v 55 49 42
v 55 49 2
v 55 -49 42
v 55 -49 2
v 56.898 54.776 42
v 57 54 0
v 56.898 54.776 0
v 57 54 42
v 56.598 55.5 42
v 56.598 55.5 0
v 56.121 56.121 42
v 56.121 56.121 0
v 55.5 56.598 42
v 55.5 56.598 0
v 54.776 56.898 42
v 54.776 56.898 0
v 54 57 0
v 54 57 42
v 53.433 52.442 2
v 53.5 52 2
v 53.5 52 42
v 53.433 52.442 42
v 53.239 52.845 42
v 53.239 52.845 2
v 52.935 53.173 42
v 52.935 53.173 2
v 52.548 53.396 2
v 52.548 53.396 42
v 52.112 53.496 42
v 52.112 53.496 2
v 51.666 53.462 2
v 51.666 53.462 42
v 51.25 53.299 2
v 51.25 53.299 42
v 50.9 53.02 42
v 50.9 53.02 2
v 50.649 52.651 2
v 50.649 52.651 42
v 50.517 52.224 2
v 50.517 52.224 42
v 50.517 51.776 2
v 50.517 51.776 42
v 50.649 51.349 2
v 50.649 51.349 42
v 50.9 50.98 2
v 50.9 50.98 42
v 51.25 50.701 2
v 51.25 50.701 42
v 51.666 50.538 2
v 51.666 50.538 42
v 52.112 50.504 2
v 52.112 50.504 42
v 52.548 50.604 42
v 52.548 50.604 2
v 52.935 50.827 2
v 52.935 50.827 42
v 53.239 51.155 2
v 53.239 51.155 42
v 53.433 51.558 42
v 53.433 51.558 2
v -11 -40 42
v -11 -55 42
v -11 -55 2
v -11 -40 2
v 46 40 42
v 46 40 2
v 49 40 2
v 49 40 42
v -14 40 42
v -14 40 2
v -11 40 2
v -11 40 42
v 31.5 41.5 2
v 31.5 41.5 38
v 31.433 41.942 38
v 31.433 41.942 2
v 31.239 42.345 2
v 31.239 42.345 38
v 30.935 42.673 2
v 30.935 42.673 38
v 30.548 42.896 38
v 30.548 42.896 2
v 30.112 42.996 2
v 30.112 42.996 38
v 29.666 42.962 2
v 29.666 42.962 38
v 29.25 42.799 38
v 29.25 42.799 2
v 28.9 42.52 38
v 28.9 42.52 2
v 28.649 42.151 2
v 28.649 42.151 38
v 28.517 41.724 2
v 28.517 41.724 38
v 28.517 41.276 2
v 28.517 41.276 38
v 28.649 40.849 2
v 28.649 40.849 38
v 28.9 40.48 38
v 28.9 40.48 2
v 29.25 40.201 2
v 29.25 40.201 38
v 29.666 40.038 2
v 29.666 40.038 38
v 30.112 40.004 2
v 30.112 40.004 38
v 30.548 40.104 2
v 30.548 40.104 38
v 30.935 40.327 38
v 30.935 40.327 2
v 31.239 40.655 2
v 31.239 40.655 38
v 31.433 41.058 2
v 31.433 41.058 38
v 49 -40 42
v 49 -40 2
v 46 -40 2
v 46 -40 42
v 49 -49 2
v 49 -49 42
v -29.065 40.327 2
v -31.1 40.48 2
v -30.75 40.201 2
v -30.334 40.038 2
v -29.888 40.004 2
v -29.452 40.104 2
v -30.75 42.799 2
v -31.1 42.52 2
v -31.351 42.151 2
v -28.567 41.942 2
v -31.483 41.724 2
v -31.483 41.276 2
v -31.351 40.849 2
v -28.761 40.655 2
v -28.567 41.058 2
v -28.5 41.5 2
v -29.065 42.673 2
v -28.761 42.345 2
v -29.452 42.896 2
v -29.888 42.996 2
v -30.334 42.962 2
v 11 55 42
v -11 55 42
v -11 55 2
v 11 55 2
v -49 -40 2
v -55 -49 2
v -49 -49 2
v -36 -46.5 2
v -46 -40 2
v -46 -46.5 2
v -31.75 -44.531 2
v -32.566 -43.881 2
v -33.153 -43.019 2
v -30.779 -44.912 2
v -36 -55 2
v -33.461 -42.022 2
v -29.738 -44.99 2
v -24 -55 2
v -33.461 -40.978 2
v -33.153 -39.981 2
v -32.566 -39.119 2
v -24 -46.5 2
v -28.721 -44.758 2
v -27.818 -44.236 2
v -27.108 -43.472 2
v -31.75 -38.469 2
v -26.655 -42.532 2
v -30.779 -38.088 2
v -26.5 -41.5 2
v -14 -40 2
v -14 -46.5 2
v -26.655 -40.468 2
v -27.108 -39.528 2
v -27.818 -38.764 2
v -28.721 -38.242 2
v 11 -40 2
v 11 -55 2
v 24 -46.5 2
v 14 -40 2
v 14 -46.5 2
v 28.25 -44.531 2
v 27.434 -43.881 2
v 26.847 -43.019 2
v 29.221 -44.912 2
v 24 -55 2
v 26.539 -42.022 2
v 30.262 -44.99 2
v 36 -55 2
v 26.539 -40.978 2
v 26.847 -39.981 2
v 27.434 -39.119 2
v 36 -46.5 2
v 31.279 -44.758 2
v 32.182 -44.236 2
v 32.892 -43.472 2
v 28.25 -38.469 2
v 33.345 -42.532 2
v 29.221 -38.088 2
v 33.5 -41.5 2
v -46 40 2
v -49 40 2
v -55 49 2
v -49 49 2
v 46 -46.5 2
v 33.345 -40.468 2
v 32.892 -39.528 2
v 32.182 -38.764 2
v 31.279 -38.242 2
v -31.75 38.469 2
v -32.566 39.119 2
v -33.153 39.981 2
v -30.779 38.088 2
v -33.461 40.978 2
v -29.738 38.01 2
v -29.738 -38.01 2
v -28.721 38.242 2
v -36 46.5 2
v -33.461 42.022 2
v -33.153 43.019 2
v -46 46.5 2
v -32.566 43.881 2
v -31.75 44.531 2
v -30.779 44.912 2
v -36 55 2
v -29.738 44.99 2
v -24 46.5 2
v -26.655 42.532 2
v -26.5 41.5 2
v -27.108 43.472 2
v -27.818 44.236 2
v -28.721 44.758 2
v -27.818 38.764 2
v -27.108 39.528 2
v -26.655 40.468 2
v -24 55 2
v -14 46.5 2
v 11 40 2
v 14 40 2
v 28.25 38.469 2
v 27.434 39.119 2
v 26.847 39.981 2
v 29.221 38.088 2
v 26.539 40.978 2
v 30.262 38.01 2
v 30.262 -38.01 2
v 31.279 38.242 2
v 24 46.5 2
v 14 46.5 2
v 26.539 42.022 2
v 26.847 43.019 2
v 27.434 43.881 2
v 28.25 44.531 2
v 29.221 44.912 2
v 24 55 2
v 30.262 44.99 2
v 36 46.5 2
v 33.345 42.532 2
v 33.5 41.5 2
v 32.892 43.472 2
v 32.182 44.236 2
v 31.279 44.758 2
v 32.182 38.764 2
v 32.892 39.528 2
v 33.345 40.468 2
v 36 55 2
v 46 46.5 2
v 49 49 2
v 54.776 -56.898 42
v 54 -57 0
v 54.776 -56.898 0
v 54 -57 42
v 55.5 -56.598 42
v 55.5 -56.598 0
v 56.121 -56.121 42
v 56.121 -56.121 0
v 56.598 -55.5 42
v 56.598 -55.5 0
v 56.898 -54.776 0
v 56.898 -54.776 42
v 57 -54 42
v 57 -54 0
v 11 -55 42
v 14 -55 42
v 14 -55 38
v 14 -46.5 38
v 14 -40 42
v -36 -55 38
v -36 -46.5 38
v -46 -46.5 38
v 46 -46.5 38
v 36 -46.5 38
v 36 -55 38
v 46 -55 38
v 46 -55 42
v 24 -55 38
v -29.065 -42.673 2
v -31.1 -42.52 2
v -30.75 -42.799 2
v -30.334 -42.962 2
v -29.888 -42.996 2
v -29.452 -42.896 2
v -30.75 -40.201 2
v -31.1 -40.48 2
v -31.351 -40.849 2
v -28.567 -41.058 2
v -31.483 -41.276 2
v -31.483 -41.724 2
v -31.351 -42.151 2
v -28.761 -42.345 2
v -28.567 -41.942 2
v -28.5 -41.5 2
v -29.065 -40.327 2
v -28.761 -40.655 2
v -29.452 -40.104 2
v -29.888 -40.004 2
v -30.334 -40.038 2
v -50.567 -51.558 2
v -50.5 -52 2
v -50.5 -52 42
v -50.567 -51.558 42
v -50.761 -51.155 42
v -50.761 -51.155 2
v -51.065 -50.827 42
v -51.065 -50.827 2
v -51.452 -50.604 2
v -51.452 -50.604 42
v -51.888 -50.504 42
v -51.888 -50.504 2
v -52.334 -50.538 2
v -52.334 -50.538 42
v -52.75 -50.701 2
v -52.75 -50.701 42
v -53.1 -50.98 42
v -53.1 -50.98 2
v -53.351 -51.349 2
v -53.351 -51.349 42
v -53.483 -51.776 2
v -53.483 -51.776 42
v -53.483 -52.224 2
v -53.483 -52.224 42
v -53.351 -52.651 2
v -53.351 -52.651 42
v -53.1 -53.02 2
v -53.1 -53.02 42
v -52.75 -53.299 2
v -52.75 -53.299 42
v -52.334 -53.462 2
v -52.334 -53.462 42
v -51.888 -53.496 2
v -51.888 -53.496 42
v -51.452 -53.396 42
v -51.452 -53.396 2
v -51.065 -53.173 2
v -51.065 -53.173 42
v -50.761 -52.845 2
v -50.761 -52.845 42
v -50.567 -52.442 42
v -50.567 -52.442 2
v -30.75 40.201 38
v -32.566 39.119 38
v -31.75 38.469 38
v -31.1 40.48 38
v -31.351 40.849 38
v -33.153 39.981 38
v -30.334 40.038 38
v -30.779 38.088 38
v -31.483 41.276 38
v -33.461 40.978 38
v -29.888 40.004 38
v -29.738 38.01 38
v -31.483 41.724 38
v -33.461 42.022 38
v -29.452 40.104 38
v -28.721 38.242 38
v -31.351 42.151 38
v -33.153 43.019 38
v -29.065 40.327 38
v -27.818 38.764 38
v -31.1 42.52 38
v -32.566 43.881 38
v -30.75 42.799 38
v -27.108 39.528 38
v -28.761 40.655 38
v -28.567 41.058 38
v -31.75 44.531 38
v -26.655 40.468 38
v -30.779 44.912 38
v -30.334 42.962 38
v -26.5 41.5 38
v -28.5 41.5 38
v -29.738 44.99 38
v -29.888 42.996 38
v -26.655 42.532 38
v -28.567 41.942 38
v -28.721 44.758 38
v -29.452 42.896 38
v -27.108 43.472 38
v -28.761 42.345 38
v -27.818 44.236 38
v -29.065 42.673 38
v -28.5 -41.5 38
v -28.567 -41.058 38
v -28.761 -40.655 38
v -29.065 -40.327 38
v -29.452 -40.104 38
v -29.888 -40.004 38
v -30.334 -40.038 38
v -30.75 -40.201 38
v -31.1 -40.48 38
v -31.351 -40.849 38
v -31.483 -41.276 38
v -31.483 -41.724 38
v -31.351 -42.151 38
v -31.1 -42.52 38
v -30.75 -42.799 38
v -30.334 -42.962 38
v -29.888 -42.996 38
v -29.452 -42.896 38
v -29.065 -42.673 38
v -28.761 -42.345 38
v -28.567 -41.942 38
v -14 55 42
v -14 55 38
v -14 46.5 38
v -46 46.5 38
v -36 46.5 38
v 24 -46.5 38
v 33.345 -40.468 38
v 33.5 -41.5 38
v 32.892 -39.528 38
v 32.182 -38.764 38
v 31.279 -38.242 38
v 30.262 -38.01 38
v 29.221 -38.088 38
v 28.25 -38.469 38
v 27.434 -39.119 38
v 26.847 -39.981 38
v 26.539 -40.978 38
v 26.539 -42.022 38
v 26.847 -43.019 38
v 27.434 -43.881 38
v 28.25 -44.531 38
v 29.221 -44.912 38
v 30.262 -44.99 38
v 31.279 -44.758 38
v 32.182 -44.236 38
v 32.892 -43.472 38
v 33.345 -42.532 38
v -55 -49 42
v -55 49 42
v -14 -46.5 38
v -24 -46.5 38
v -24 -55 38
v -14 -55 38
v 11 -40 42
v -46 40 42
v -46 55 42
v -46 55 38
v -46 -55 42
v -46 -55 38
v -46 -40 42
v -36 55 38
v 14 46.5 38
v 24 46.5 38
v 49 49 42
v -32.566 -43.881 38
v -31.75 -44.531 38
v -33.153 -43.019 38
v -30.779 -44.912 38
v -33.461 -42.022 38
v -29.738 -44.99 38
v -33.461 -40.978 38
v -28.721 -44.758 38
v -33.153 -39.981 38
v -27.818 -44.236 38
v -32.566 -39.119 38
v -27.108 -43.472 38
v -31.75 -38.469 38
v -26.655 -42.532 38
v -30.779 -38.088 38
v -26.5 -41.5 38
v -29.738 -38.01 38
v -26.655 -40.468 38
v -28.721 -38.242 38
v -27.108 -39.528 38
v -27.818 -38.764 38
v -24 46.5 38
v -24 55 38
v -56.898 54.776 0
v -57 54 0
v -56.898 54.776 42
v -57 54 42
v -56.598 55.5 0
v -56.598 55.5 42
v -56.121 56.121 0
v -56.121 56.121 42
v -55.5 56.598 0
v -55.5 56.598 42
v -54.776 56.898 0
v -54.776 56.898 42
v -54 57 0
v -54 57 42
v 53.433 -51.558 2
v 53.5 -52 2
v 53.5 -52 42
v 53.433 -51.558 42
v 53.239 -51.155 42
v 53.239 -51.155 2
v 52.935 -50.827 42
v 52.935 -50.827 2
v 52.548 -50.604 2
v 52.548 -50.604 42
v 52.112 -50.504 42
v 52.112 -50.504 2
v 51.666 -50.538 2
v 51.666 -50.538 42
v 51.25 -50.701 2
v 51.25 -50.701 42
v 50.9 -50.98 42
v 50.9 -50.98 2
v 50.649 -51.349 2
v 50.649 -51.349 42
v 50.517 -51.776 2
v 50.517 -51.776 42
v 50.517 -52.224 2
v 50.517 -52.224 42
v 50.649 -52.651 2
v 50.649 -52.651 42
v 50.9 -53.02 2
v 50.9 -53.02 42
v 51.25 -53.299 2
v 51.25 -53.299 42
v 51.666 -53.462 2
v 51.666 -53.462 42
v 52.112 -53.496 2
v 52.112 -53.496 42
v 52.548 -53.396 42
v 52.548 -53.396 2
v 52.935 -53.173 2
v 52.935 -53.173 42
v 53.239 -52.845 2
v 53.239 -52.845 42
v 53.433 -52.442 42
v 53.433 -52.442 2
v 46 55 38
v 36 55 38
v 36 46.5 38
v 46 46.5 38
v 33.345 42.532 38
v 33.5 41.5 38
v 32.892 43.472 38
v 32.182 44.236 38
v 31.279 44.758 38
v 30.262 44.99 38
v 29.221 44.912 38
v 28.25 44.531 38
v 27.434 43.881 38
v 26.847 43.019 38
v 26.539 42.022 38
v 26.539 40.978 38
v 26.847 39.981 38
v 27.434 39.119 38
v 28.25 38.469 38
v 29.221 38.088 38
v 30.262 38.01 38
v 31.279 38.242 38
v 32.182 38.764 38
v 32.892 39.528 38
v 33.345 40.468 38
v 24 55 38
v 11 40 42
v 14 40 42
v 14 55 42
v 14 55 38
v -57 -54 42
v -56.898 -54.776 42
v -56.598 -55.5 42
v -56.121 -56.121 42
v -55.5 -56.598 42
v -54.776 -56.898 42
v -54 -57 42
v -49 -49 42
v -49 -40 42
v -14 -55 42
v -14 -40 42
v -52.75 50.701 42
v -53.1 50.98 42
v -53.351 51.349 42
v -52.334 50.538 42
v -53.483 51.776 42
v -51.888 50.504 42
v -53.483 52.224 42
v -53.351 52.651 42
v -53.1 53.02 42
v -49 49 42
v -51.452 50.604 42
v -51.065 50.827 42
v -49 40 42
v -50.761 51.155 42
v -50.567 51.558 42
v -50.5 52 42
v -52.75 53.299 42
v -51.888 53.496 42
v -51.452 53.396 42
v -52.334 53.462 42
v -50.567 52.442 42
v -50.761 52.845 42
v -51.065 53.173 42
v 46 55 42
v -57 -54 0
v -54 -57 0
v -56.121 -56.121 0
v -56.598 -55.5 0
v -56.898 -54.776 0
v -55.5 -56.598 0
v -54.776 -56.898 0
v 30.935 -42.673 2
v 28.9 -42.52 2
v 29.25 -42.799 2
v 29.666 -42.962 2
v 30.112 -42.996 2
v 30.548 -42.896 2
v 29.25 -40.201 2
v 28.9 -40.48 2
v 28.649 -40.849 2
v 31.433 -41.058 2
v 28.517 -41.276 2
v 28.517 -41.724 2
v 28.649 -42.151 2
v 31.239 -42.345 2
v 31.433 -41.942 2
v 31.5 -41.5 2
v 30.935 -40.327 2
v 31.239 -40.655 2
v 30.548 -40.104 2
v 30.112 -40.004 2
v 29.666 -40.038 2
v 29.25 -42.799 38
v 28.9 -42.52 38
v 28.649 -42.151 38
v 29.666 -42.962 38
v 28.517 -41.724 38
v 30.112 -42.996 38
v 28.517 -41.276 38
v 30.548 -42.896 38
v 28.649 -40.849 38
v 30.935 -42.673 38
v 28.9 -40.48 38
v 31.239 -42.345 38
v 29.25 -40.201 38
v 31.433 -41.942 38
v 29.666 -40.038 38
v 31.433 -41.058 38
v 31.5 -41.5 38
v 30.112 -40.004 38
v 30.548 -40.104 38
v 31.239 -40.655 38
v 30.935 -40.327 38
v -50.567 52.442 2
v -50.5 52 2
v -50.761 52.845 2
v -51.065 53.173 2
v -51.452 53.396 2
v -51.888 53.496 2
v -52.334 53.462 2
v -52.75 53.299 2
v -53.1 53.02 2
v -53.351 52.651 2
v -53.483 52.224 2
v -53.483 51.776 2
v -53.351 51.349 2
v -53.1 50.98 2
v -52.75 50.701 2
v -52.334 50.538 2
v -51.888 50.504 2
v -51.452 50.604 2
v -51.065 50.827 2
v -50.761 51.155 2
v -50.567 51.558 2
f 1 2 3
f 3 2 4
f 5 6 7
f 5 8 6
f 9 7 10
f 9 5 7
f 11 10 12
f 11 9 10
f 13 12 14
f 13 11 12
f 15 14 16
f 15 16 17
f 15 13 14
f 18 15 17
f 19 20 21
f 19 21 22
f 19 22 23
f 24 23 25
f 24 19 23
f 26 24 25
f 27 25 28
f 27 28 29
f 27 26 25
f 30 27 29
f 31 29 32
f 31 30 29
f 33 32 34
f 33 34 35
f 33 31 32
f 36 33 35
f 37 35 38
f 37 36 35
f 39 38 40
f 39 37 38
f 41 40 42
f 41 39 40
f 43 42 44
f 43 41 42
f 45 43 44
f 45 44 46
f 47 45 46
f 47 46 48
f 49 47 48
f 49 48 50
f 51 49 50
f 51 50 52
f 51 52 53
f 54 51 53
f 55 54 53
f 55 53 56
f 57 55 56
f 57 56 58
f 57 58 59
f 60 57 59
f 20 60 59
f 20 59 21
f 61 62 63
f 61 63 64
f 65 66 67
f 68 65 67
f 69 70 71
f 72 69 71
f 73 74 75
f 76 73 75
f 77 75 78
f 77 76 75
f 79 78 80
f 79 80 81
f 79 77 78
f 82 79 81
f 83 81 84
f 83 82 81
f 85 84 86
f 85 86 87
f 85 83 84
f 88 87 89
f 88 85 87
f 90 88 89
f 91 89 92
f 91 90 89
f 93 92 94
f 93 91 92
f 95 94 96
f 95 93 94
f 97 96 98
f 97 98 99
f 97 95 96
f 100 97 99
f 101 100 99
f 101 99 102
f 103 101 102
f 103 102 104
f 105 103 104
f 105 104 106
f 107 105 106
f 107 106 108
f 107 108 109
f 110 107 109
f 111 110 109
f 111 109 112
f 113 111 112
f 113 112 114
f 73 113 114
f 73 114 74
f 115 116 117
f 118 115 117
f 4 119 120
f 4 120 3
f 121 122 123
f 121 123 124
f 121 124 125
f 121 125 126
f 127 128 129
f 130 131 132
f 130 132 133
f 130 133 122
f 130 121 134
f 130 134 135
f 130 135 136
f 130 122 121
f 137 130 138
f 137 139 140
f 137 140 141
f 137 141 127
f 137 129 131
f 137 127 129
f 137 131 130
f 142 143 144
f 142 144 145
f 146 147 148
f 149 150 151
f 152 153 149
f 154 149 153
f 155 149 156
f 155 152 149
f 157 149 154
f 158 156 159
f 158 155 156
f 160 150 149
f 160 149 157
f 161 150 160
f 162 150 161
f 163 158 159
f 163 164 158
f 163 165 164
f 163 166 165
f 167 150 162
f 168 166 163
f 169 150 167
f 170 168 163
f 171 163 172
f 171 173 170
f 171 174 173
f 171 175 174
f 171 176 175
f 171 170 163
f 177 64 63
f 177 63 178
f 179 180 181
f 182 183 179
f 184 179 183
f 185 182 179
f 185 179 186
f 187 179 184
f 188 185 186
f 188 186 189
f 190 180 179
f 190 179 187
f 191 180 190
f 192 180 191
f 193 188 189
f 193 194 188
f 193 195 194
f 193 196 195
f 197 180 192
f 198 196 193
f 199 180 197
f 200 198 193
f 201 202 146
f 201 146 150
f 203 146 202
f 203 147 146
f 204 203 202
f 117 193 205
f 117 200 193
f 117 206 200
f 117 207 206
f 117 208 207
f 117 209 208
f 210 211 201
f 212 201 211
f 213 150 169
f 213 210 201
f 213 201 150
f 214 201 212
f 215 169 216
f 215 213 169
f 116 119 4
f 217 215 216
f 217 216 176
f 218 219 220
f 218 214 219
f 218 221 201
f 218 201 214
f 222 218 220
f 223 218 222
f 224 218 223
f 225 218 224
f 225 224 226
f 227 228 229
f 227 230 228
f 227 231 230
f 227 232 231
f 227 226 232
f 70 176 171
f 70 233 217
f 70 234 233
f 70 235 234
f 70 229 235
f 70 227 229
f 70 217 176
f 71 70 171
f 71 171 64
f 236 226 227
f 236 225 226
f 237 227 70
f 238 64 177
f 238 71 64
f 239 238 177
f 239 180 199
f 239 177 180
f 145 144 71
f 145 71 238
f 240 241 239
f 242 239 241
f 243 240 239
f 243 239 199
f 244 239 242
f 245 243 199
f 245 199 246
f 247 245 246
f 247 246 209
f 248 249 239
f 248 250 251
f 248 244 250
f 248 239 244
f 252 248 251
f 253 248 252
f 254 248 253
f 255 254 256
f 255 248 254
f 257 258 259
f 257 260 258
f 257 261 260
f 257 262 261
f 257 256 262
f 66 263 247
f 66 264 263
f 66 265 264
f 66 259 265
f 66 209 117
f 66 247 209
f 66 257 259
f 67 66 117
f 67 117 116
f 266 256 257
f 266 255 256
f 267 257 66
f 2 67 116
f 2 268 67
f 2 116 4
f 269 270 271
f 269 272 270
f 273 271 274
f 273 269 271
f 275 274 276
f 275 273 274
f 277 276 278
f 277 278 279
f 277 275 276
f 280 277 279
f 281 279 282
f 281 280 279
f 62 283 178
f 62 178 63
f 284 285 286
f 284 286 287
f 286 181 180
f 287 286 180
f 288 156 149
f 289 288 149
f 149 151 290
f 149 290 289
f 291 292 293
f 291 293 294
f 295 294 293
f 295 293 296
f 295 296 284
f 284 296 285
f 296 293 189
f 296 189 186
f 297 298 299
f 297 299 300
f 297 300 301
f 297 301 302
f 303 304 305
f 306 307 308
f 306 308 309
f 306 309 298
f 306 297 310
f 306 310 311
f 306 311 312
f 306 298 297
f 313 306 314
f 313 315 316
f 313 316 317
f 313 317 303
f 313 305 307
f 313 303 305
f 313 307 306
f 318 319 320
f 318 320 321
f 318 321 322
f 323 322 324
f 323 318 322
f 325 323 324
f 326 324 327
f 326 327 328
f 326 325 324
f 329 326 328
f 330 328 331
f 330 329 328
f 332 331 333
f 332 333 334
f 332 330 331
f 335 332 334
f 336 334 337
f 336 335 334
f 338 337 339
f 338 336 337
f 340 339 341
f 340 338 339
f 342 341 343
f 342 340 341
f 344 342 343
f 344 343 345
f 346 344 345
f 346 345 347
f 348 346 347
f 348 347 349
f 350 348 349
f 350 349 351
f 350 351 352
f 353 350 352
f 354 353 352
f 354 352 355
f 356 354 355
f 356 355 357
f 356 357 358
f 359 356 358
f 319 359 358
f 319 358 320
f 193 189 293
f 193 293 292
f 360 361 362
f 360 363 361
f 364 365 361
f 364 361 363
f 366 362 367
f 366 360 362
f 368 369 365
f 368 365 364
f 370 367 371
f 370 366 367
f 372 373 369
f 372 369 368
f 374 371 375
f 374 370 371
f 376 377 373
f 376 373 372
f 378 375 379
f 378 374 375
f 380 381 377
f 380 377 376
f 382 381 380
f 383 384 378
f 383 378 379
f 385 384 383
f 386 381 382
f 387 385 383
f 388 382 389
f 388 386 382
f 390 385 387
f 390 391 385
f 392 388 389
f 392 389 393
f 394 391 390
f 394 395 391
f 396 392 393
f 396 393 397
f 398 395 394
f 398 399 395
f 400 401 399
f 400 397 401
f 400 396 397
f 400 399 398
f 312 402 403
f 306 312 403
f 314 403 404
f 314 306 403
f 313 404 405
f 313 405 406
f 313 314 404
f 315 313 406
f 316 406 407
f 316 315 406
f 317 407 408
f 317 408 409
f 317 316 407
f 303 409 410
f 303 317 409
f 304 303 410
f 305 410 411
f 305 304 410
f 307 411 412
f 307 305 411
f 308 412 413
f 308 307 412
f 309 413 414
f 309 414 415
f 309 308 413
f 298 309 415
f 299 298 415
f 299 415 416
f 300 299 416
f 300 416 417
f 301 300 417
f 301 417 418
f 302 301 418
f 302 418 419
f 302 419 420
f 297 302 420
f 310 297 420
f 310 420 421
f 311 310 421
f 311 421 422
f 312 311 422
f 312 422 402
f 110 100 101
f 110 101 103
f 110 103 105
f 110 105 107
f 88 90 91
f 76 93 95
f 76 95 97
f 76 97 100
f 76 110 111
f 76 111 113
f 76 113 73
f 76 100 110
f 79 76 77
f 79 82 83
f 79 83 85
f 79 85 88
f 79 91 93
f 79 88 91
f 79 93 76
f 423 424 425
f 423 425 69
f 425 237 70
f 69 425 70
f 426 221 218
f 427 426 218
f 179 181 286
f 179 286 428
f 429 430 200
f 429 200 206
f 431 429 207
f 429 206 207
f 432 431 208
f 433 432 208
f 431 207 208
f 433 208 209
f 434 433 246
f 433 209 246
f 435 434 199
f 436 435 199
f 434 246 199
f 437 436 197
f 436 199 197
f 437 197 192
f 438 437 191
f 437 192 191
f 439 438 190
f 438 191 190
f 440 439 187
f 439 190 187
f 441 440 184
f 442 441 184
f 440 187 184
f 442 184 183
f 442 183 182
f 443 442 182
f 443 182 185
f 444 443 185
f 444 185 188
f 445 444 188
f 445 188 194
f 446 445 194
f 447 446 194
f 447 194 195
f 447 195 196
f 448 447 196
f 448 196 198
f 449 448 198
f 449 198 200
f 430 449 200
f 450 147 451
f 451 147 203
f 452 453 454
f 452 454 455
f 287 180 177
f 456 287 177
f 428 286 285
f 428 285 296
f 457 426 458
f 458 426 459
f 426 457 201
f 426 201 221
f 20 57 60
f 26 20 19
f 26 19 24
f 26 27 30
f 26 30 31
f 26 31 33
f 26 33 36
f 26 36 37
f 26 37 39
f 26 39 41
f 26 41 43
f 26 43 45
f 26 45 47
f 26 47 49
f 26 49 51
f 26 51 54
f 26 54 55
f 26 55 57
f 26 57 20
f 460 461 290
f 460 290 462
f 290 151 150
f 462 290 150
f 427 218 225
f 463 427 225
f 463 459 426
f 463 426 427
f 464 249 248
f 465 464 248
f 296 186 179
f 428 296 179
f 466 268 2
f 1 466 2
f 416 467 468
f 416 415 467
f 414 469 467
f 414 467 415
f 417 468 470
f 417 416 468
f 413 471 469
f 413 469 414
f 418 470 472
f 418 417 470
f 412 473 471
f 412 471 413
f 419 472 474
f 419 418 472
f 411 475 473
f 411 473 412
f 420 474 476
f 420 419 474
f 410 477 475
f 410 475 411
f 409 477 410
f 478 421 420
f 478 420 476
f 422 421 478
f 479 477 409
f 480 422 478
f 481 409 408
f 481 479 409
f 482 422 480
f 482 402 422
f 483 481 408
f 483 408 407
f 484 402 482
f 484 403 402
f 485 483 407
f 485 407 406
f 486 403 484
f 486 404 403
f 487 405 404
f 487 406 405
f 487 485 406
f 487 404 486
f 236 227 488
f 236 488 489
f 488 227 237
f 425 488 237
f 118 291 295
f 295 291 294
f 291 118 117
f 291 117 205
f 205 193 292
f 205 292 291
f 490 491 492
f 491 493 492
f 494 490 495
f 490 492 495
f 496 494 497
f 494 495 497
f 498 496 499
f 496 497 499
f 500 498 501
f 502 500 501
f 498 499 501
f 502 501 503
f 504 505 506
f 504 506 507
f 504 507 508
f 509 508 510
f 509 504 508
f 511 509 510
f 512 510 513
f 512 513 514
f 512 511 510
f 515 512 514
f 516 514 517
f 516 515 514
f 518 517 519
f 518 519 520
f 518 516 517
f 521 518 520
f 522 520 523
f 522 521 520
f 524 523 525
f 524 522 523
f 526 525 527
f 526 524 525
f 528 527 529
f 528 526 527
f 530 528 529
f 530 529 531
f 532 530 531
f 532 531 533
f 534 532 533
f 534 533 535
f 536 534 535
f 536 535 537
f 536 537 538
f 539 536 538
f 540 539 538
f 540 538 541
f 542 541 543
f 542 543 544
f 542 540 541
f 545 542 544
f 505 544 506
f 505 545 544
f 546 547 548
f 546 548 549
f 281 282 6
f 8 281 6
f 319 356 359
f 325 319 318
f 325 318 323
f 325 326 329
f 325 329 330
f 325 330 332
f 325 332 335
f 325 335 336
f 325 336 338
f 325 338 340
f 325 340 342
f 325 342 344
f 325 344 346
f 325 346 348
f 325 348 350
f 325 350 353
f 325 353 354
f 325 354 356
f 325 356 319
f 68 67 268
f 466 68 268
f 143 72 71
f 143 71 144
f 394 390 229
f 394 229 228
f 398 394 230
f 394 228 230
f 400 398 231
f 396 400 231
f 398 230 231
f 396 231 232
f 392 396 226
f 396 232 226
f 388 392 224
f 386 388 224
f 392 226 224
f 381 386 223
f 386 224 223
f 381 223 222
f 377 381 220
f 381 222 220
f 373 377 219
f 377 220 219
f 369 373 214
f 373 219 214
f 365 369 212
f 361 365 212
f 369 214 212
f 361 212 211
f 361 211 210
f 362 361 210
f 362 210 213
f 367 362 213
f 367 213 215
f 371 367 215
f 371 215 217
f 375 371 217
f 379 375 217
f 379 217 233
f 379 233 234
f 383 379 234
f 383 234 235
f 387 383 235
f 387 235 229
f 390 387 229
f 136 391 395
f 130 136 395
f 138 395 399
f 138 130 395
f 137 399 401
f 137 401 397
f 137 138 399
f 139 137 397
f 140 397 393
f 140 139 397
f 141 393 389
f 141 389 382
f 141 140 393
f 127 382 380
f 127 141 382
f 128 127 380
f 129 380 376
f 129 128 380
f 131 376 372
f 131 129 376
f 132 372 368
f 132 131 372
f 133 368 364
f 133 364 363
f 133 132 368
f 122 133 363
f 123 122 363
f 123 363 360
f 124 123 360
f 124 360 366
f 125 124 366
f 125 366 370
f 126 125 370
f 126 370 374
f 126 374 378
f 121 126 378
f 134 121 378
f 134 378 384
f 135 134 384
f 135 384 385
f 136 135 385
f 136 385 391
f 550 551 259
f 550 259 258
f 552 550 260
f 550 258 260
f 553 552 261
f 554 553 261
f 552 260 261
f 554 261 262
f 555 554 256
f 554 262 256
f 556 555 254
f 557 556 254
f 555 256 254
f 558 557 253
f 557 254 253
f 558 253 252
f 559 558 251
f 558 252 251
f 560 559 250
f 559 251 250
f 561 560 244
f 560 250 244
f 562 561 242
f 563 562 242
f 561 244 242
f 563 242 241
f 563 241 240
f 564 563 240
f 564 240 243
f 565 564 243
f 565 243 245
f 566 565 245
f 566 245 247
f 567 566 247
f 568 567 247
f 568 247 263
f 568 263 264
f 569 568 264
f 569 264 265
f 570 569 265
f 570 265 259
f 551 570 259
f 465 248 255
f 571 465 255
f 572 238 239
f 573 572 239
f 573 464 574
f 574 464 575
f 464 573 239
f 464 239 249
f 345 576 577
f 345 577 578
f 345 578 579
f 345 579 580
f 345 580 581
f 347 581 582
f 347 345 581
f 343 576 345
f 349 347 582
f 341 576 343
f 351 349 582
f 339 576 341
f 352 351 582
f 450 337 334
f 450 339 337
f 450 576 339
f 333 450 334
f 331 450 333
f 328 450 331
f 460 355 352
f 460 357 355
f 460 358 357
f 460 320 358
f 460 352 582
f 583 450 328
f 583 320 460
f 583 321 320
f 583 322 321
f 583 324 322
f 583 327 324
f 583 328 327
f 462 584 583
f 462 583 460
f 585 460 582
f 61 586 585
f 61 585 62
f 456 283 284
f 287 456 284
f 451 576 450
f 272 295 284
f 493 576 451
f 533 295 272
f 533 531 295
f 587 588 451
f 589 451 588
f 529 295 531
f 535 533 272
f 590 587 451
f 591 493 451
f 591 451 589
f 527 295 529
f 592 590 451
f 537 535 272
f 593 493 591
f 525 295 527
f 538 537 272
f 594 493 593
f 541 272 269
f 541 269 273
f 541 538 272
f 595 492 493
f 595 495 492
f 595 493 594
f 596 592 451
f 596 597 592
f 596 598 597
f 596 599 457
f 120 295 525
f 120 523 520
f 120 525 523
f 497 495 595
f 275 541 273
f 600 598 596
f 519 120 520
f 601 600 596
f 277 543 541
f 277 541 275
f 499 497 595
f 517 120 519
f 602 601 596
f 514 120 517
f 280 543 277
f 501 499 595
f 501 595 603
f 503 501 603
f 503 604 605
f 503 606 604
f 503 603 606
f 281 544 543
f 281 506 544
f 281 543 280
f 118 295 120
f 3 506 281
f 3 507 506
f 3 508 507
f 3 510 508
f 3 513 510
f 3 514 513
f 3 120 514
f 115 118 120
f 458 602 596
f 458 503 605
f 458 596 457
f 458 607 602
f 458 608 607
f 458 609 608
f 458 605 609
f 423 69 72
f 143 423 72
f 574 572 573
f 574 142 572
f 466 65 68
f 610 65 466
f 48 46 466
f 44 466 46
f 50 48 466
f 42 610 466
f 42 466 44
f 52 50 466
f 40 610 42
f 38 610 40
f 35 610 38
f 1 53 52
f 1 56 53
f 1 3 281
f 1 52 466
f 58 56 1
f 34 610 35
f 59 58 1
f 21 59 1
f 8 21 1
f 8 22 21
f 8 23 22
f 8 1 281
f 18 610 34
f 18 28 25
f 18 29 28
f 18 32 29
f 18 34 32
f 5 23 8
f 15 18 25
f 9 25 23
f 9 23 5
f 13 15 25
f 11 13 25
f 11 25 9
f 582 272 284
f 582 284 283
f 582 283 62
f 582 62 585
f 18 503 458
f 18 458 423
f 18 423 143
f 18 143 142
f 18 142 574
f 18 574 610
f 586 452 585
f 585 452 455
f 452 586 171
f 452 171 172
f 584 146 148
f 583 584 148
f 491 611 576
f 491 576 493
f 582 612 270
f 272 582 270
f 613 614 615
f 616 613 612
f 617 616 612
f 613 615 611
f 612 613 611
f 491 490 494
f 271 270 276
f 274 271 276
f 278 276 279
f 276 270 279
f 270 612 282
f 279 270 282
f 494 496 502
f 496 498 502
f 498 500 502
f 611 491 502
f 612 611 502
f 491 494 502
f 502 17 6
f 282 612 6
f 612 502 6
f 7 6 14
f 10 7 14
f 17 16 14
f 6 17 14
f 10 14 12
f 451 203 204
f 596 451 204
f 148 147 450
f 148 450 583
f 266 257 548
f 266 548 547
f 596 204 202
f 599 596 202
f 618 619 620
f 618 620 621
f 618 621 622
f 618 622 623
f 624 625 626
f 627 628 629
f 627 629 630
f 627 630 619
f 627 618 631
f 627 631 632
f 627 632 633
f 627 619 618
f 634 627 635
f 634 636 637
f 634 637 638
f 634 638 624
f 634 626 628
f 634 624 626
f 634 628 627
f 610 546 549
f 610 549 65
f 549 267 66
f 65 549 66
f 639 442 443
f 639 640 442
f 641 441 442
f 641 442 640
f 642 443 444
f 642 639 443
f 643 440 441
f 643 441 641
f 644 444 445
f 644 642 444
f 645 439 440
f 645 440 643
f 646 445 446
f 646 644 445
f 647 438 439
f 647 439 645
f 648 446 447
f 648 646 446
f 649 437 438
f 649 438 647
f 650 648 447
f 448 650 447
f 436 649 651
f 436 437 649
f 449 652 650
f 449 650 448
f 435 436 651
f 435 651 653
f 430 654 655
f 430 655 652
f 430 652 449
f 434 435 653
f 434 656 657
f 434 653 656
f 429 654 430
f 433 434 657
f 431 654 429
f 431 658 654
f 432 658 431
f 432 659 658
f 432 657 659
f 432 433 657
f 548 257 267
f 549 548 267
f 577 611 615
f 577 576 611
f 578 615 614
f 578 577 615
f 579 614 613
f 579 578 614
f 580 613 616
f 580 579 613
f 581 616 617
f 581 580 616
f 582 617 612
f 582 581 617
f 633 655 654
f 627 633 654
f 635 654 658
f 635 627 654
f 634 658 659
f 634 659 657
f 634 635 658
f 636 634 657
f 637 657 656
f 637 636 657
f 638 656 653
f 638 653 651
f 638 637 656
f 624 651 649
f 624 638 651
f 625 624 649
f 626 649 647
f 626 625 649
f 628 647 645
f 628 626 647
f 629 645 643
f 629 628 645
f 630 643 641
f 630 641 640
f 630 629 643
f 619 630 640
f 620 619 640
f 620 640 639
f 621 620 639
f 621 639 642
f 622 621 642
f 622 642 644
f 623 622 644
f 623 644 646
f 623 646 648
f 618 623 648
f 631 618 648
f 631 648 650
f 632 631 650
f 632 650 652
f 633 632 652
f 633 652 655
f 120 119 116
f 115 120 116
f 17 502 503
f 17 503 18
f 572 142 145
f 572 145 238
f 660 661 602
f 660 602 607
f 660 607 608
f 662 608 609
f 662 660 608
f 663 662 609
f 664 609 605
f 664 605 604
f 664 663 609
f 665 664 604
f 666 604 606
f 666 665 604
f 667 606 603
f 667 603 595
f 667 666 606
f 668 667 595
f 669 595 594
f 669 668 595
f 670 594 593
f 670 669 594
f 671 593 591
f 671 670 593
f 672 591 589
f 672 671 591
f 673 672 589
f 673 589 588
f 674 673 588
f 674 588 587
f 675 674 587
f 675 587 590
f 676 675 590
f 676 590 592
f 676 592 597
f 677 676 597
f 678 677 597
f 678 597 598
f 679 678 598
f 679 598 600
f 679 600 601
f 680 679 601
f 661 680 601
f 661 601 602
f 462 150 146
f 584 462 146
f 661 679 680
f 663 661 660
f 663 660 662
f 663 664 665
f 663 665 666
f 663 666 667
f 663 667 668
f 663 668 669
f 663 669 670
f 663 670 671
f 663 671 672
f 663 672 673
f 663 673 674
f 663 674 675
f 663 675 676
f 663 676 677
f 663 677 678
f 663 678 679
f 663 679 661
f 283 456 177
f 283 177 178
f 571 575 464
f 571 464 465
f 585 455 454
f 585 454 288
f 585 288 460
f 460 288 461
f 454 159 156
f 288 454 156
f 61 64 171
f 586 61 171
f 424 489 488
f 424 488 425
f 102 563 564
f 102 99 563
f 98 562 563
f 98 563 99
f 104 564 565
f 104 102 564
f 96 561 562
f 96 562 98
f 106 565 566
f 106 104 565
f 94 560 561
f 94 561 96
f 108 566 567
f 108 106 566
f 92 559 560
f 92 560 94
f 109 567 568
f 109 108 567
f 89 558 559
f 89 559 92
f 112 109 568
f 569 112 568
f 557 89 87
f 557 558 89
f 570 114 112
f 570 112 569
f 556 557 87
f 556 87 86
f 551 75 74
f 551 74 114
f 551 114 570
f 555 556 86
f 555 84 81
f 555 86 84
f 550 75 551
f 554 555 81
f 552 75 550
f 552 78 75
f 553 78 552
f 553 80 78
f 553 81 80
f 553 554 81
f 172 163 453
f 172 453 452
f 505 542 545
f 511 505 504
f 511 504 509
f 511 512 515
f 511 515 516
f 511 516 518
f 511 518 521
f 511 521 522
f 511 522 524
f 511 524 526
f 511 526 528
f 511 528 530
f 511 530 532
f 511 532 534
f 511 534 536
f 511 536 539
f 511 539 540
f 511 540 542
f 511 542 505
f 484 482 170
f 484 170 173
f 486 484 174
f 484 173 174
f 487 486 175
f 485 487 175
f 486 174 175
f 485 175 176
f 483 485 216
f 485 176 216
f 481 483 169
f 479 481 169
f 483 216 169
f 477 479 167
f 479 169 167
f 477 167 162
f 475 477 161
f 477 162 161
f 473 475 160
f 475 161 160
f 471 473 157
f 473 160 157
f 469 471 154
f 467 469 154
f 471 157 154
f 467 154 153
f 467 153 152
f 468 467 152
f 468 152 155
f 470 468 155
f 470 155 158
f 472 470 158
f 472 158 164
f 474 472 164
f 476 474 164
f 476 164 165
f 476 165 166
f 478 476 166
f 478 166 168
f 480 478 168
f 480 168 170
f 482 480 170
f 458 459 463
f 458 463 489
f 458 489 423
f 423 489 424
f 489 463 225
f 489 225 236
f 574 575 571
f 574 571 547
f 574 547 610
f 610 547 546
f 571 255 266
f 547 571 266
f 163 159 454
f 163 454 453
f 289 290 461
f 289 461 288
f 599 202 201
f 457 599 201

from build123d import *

# Parameters (mm, degrees)
F0_W     = 114
F0_H     = 114
F0_W_2   = 6
F0_H_2   = 6
F0_R     = 1.5
F1_DEPTH = 42
F0_R_2   = 3.5
F2_DEPTH = 38
F0_W_3   = 10
F0_H_3   = 8.5
F3_DEPTH = 2
F4_DEPTH = 2
F5_R     = 3


with BuildPart() as f1:
    # F0 (on Top) → F1 (new body)
    with BuildSketch(Plane.XY):
        Rectangle(F0_W, F0_H)
        Polygon((49, 55), (55, 55), (55, 49), (55, -49), (55, -55), (49, -55), (46, -55), (36, -55), (24, -55), (14, -55), (11, -55), (-11, -55), (-14, -55), (-24, -55), (-36, -55), (-46, -55), (-49, -55), (-55, -55), (-55, -49), (-55, 49), (-55, 55), (-49, 55), (-46, 55), (-36, 55), (-24, 55), (-14, 55), (-11, 55), (11, 55), (14, 55), (24, 55), (36, 55), (46, 55), align=None, mode=Mode.SUBTRACT)
        Polygon((-11, 40), (-11, 55), (-14, 55), (-14, 46.5), (-14, 40), align=None)
        Polygon((14, 46.5), (14, 55), (11, 55), (11, 40), (14, 40), align=None)
        Polygon((49, 49), (49, 55), (46, 55), (46, 46.5), (46, 40), (49, 40), align=None)
        Polygon((-46, 46.5), (-46, 55), (-49, 55), (-49, 49), (-49, 40), (-46, 40), align=None)
        Polygon((-49, -55), (-46, -55), (-46, -46.5), (-46, -40), (-49, -40), (-49, -49), align=None)
        Polygon((-14, -55), (-11, -55), (-11, -40), (-14, -40), (-14, -46.5), align=None)
        Polygon((11, -55), (14, -55), (14, -46.5), (14, -40), (11, -40), align=None)
        Polygon((49, -55), (49, -49), (49, -40), (46, -40), (46, -46.5), (46, -55), align=None)
        with Locations((-52, 52)):
            Rectangle(F0_W_2, F0_H_2)
        with Locations((-52, 52)):
            Circle(F0_R, mode=Mode.SUBTRACT)
        with Locations((52, 52)):
            Rectangle(F0_W_2, F0_H_2)
        with Locations((52, 52)):
            Circle(F0_R, mode=Mode.SUBTRACT)
        with Locations((52, -52)):
            Rectangle(F0_W_2, F0_H_2)
        with Locations((52, -52)):
            Circle(F0_R, mode=Mode.SUBTRACT)
        with Locations((-52, -52)):
            Rectangle(F0_W_2, F0_H_2)
        with Locations((-52, -52)):
            Circle(F0_R, mode=Mode.SUBTRACT)
    extrude(amount=F1_DEPTH)

    # F0 (on Top) → F2, piece 5 (join)
    with BuildSketch(Plane.XY):
        with Locations((-41, 50.75)):
            Rectangle(F0_W_3, F0_H_3)
        with Locations((-19, 50.75)):
            Rectangle(F0_W_3, F0_H_3)
        with Locations((19, 50.75)):
            Rectangle(F0_W_3, F0_H_3)
        with Locations((41, 50.75)):
            Rectangle(F0_W_3, F0_H_3)
        with Locations((-19, -50.75)):
            Rectangle(F0_W_3, F0_H_3)
        with Locations((-41, -50.75)):
            Rectangle(F0_W_3, F0_H_3)
        with Locations((19, -50.75)):
            Rectangle(F0_W_3, F0_H_3)
        with Locations((41, -50.75)):
            Rectangle(F0_W_3, F0_H_3)
    extrude(amount=F2_DEPTH)

    # F0 (on Top) → F3 (join)
    with BuildSketch(Plane.XY):
        with Locations((52, 52)):
            Rectangle(F0_W_2, F0_H_2)
        with Locations((52, 52)):
            Circle(F0_R, mode=Mode.SUBTRACT)
        with Locations((52, -52)):
            Rectangle(F0_W_2, F0_H_2)
        with Locations((52, -52)):
            Circle(F0_R, mode=Mode.SUBTRACT)
    extrude(amount=F3_DEPTH)



with BuildPart() as f2:
    # F0 (on Top) → F2 (new body)
    with BuildSketch(Plane.XY):
        with Locations((-30, 41.5)):
            Circle(F0_R_2)
        with Locations((-30, 41.5)):
            Circle(F0_R, mode=Mode.SUBTRACT)
    extrude(amount=F2_DEPTH)


with BuildPart() as f2b:
    # F0 (on Top) → F2, piece 2 (new body)
    with BuildSketch(Plane.XY):
        with Locations((30, 41.5)):
            Circle(F0_R_2)
        with Locations((30, 41.5)):
            Circle(F0_R, mode=Mode.SUBTRACT)
    extrude(amount=F2_DEPTH)


with BuildPart() as f2c:
    # F0 (on Top) → F2, piece 3 (new body)
    with BuildSketch(Plane.XY):
        with Locations((30, -41.5)):
            Circle(F0_R_2)
        with Locations((30, -41.5)):
            Circle(F0_R, mode=Mode.SUBTRACT)
    extrude(amount=F2_DEPTH)


with BuildPart() as f2d:
    # F0 (on Top) → F2, piece 4 (new body)
    with BuildSketch(Plane.XY):
        with Locations((-30, -41.5)):
            Circle(F0_R_2)
        with Locations((-30, -41.5)):
            Circle(F0_R, mode=Mode.SUBTRACT)
    extrude(amount=F2_DEPTH)


with BuildPart() as f1_1:
    add(f1.part)

    add(f2.part)  # F4 merges F2

    add(f2b.part)  # F4 merges F2b

    add(f2c.part)  # F4 merges F2c

    add(f2d.part)  # F4 merges F2d
    # F0 (on Top) → F4 (join)
    with BuildSketch(Plane.XY):
        Polygon((55, -49), (55, 49), (49, 49), (49, 40), (46, 40), (46, 46.5), (36, 46.5), (36, 55), (24, 55), (24, 46.5), (14, 46.5), (14, 40), (11, 40), (11, 55), (-11, 55), (-11, 40), (-14, 40), (-14, 46.5), (-24, 46.5), (-24, 55), (-36, 55), (-36, 46.5), (-46, 46.5), (-46, 40), (-49, 40), (-49, 49), (-55, 49), (-55, -49), (-49, -49), (-49, -40), (-46, -40), (-46, -46.5), (-36, -46.5), (-36, -55), (-24, -55), (-24, -46.5), (-14, -46.5), (-14, -40), (-11, -40), (-11, -55), (11, -55), (11, -40), (14, -40), (14, -46.5), (24, -46.5), (24, -55), (36, -55), (36, -46.5), (46, -46.5), (46, -40), (49, -40), (49, -49), align=None)
        with Locations((-30, -41.5)):
            Circle(F0_R_2, mode=Mode.SUBTRACT)
        with Locations((30, -41.5)):
            Circle(F0_R_2, mode=Mode.SUBTRACT)
        with Locations((-30, 41.5)):
            Circle(F0_R_2, mode=Mode.SUBTRACT)
        with Locations((30, 41.5)):
            Circle(F0_R_2, mode=Mode.SUBTRACT)
        with Locations((-52, 52)):
            Circle(F0_R)
        with Locations((-30, 41.5)):
            Circle(F0_R)
        with Locations((30, 41.5)):
            Circle(F0_R)
        with Locations((52, 52)):
            Circle(F0_R)
        with Locations((-52, -52)):
            Circle(F0_R)
        with Locations((-30, -41.5)):
            Circle(F0_R)
        with Locations((30, -41.5)):
            Circle(F0_R)
        with Locations((52, -52)):
            Circle(F0_R)
    extrude(amount=F4_DEPTH)

    # F5
    f5_edges = [f1_1.edges().sort_by_distance(p)[0] for p in [
        (-57, 57, 21),
        (57, 57, 21),
        (-57, -57, 21),
        (57, -57, 21),
    ]]
    fillet(f5_edges, radius=F5_R)


solid = f1_1.part
